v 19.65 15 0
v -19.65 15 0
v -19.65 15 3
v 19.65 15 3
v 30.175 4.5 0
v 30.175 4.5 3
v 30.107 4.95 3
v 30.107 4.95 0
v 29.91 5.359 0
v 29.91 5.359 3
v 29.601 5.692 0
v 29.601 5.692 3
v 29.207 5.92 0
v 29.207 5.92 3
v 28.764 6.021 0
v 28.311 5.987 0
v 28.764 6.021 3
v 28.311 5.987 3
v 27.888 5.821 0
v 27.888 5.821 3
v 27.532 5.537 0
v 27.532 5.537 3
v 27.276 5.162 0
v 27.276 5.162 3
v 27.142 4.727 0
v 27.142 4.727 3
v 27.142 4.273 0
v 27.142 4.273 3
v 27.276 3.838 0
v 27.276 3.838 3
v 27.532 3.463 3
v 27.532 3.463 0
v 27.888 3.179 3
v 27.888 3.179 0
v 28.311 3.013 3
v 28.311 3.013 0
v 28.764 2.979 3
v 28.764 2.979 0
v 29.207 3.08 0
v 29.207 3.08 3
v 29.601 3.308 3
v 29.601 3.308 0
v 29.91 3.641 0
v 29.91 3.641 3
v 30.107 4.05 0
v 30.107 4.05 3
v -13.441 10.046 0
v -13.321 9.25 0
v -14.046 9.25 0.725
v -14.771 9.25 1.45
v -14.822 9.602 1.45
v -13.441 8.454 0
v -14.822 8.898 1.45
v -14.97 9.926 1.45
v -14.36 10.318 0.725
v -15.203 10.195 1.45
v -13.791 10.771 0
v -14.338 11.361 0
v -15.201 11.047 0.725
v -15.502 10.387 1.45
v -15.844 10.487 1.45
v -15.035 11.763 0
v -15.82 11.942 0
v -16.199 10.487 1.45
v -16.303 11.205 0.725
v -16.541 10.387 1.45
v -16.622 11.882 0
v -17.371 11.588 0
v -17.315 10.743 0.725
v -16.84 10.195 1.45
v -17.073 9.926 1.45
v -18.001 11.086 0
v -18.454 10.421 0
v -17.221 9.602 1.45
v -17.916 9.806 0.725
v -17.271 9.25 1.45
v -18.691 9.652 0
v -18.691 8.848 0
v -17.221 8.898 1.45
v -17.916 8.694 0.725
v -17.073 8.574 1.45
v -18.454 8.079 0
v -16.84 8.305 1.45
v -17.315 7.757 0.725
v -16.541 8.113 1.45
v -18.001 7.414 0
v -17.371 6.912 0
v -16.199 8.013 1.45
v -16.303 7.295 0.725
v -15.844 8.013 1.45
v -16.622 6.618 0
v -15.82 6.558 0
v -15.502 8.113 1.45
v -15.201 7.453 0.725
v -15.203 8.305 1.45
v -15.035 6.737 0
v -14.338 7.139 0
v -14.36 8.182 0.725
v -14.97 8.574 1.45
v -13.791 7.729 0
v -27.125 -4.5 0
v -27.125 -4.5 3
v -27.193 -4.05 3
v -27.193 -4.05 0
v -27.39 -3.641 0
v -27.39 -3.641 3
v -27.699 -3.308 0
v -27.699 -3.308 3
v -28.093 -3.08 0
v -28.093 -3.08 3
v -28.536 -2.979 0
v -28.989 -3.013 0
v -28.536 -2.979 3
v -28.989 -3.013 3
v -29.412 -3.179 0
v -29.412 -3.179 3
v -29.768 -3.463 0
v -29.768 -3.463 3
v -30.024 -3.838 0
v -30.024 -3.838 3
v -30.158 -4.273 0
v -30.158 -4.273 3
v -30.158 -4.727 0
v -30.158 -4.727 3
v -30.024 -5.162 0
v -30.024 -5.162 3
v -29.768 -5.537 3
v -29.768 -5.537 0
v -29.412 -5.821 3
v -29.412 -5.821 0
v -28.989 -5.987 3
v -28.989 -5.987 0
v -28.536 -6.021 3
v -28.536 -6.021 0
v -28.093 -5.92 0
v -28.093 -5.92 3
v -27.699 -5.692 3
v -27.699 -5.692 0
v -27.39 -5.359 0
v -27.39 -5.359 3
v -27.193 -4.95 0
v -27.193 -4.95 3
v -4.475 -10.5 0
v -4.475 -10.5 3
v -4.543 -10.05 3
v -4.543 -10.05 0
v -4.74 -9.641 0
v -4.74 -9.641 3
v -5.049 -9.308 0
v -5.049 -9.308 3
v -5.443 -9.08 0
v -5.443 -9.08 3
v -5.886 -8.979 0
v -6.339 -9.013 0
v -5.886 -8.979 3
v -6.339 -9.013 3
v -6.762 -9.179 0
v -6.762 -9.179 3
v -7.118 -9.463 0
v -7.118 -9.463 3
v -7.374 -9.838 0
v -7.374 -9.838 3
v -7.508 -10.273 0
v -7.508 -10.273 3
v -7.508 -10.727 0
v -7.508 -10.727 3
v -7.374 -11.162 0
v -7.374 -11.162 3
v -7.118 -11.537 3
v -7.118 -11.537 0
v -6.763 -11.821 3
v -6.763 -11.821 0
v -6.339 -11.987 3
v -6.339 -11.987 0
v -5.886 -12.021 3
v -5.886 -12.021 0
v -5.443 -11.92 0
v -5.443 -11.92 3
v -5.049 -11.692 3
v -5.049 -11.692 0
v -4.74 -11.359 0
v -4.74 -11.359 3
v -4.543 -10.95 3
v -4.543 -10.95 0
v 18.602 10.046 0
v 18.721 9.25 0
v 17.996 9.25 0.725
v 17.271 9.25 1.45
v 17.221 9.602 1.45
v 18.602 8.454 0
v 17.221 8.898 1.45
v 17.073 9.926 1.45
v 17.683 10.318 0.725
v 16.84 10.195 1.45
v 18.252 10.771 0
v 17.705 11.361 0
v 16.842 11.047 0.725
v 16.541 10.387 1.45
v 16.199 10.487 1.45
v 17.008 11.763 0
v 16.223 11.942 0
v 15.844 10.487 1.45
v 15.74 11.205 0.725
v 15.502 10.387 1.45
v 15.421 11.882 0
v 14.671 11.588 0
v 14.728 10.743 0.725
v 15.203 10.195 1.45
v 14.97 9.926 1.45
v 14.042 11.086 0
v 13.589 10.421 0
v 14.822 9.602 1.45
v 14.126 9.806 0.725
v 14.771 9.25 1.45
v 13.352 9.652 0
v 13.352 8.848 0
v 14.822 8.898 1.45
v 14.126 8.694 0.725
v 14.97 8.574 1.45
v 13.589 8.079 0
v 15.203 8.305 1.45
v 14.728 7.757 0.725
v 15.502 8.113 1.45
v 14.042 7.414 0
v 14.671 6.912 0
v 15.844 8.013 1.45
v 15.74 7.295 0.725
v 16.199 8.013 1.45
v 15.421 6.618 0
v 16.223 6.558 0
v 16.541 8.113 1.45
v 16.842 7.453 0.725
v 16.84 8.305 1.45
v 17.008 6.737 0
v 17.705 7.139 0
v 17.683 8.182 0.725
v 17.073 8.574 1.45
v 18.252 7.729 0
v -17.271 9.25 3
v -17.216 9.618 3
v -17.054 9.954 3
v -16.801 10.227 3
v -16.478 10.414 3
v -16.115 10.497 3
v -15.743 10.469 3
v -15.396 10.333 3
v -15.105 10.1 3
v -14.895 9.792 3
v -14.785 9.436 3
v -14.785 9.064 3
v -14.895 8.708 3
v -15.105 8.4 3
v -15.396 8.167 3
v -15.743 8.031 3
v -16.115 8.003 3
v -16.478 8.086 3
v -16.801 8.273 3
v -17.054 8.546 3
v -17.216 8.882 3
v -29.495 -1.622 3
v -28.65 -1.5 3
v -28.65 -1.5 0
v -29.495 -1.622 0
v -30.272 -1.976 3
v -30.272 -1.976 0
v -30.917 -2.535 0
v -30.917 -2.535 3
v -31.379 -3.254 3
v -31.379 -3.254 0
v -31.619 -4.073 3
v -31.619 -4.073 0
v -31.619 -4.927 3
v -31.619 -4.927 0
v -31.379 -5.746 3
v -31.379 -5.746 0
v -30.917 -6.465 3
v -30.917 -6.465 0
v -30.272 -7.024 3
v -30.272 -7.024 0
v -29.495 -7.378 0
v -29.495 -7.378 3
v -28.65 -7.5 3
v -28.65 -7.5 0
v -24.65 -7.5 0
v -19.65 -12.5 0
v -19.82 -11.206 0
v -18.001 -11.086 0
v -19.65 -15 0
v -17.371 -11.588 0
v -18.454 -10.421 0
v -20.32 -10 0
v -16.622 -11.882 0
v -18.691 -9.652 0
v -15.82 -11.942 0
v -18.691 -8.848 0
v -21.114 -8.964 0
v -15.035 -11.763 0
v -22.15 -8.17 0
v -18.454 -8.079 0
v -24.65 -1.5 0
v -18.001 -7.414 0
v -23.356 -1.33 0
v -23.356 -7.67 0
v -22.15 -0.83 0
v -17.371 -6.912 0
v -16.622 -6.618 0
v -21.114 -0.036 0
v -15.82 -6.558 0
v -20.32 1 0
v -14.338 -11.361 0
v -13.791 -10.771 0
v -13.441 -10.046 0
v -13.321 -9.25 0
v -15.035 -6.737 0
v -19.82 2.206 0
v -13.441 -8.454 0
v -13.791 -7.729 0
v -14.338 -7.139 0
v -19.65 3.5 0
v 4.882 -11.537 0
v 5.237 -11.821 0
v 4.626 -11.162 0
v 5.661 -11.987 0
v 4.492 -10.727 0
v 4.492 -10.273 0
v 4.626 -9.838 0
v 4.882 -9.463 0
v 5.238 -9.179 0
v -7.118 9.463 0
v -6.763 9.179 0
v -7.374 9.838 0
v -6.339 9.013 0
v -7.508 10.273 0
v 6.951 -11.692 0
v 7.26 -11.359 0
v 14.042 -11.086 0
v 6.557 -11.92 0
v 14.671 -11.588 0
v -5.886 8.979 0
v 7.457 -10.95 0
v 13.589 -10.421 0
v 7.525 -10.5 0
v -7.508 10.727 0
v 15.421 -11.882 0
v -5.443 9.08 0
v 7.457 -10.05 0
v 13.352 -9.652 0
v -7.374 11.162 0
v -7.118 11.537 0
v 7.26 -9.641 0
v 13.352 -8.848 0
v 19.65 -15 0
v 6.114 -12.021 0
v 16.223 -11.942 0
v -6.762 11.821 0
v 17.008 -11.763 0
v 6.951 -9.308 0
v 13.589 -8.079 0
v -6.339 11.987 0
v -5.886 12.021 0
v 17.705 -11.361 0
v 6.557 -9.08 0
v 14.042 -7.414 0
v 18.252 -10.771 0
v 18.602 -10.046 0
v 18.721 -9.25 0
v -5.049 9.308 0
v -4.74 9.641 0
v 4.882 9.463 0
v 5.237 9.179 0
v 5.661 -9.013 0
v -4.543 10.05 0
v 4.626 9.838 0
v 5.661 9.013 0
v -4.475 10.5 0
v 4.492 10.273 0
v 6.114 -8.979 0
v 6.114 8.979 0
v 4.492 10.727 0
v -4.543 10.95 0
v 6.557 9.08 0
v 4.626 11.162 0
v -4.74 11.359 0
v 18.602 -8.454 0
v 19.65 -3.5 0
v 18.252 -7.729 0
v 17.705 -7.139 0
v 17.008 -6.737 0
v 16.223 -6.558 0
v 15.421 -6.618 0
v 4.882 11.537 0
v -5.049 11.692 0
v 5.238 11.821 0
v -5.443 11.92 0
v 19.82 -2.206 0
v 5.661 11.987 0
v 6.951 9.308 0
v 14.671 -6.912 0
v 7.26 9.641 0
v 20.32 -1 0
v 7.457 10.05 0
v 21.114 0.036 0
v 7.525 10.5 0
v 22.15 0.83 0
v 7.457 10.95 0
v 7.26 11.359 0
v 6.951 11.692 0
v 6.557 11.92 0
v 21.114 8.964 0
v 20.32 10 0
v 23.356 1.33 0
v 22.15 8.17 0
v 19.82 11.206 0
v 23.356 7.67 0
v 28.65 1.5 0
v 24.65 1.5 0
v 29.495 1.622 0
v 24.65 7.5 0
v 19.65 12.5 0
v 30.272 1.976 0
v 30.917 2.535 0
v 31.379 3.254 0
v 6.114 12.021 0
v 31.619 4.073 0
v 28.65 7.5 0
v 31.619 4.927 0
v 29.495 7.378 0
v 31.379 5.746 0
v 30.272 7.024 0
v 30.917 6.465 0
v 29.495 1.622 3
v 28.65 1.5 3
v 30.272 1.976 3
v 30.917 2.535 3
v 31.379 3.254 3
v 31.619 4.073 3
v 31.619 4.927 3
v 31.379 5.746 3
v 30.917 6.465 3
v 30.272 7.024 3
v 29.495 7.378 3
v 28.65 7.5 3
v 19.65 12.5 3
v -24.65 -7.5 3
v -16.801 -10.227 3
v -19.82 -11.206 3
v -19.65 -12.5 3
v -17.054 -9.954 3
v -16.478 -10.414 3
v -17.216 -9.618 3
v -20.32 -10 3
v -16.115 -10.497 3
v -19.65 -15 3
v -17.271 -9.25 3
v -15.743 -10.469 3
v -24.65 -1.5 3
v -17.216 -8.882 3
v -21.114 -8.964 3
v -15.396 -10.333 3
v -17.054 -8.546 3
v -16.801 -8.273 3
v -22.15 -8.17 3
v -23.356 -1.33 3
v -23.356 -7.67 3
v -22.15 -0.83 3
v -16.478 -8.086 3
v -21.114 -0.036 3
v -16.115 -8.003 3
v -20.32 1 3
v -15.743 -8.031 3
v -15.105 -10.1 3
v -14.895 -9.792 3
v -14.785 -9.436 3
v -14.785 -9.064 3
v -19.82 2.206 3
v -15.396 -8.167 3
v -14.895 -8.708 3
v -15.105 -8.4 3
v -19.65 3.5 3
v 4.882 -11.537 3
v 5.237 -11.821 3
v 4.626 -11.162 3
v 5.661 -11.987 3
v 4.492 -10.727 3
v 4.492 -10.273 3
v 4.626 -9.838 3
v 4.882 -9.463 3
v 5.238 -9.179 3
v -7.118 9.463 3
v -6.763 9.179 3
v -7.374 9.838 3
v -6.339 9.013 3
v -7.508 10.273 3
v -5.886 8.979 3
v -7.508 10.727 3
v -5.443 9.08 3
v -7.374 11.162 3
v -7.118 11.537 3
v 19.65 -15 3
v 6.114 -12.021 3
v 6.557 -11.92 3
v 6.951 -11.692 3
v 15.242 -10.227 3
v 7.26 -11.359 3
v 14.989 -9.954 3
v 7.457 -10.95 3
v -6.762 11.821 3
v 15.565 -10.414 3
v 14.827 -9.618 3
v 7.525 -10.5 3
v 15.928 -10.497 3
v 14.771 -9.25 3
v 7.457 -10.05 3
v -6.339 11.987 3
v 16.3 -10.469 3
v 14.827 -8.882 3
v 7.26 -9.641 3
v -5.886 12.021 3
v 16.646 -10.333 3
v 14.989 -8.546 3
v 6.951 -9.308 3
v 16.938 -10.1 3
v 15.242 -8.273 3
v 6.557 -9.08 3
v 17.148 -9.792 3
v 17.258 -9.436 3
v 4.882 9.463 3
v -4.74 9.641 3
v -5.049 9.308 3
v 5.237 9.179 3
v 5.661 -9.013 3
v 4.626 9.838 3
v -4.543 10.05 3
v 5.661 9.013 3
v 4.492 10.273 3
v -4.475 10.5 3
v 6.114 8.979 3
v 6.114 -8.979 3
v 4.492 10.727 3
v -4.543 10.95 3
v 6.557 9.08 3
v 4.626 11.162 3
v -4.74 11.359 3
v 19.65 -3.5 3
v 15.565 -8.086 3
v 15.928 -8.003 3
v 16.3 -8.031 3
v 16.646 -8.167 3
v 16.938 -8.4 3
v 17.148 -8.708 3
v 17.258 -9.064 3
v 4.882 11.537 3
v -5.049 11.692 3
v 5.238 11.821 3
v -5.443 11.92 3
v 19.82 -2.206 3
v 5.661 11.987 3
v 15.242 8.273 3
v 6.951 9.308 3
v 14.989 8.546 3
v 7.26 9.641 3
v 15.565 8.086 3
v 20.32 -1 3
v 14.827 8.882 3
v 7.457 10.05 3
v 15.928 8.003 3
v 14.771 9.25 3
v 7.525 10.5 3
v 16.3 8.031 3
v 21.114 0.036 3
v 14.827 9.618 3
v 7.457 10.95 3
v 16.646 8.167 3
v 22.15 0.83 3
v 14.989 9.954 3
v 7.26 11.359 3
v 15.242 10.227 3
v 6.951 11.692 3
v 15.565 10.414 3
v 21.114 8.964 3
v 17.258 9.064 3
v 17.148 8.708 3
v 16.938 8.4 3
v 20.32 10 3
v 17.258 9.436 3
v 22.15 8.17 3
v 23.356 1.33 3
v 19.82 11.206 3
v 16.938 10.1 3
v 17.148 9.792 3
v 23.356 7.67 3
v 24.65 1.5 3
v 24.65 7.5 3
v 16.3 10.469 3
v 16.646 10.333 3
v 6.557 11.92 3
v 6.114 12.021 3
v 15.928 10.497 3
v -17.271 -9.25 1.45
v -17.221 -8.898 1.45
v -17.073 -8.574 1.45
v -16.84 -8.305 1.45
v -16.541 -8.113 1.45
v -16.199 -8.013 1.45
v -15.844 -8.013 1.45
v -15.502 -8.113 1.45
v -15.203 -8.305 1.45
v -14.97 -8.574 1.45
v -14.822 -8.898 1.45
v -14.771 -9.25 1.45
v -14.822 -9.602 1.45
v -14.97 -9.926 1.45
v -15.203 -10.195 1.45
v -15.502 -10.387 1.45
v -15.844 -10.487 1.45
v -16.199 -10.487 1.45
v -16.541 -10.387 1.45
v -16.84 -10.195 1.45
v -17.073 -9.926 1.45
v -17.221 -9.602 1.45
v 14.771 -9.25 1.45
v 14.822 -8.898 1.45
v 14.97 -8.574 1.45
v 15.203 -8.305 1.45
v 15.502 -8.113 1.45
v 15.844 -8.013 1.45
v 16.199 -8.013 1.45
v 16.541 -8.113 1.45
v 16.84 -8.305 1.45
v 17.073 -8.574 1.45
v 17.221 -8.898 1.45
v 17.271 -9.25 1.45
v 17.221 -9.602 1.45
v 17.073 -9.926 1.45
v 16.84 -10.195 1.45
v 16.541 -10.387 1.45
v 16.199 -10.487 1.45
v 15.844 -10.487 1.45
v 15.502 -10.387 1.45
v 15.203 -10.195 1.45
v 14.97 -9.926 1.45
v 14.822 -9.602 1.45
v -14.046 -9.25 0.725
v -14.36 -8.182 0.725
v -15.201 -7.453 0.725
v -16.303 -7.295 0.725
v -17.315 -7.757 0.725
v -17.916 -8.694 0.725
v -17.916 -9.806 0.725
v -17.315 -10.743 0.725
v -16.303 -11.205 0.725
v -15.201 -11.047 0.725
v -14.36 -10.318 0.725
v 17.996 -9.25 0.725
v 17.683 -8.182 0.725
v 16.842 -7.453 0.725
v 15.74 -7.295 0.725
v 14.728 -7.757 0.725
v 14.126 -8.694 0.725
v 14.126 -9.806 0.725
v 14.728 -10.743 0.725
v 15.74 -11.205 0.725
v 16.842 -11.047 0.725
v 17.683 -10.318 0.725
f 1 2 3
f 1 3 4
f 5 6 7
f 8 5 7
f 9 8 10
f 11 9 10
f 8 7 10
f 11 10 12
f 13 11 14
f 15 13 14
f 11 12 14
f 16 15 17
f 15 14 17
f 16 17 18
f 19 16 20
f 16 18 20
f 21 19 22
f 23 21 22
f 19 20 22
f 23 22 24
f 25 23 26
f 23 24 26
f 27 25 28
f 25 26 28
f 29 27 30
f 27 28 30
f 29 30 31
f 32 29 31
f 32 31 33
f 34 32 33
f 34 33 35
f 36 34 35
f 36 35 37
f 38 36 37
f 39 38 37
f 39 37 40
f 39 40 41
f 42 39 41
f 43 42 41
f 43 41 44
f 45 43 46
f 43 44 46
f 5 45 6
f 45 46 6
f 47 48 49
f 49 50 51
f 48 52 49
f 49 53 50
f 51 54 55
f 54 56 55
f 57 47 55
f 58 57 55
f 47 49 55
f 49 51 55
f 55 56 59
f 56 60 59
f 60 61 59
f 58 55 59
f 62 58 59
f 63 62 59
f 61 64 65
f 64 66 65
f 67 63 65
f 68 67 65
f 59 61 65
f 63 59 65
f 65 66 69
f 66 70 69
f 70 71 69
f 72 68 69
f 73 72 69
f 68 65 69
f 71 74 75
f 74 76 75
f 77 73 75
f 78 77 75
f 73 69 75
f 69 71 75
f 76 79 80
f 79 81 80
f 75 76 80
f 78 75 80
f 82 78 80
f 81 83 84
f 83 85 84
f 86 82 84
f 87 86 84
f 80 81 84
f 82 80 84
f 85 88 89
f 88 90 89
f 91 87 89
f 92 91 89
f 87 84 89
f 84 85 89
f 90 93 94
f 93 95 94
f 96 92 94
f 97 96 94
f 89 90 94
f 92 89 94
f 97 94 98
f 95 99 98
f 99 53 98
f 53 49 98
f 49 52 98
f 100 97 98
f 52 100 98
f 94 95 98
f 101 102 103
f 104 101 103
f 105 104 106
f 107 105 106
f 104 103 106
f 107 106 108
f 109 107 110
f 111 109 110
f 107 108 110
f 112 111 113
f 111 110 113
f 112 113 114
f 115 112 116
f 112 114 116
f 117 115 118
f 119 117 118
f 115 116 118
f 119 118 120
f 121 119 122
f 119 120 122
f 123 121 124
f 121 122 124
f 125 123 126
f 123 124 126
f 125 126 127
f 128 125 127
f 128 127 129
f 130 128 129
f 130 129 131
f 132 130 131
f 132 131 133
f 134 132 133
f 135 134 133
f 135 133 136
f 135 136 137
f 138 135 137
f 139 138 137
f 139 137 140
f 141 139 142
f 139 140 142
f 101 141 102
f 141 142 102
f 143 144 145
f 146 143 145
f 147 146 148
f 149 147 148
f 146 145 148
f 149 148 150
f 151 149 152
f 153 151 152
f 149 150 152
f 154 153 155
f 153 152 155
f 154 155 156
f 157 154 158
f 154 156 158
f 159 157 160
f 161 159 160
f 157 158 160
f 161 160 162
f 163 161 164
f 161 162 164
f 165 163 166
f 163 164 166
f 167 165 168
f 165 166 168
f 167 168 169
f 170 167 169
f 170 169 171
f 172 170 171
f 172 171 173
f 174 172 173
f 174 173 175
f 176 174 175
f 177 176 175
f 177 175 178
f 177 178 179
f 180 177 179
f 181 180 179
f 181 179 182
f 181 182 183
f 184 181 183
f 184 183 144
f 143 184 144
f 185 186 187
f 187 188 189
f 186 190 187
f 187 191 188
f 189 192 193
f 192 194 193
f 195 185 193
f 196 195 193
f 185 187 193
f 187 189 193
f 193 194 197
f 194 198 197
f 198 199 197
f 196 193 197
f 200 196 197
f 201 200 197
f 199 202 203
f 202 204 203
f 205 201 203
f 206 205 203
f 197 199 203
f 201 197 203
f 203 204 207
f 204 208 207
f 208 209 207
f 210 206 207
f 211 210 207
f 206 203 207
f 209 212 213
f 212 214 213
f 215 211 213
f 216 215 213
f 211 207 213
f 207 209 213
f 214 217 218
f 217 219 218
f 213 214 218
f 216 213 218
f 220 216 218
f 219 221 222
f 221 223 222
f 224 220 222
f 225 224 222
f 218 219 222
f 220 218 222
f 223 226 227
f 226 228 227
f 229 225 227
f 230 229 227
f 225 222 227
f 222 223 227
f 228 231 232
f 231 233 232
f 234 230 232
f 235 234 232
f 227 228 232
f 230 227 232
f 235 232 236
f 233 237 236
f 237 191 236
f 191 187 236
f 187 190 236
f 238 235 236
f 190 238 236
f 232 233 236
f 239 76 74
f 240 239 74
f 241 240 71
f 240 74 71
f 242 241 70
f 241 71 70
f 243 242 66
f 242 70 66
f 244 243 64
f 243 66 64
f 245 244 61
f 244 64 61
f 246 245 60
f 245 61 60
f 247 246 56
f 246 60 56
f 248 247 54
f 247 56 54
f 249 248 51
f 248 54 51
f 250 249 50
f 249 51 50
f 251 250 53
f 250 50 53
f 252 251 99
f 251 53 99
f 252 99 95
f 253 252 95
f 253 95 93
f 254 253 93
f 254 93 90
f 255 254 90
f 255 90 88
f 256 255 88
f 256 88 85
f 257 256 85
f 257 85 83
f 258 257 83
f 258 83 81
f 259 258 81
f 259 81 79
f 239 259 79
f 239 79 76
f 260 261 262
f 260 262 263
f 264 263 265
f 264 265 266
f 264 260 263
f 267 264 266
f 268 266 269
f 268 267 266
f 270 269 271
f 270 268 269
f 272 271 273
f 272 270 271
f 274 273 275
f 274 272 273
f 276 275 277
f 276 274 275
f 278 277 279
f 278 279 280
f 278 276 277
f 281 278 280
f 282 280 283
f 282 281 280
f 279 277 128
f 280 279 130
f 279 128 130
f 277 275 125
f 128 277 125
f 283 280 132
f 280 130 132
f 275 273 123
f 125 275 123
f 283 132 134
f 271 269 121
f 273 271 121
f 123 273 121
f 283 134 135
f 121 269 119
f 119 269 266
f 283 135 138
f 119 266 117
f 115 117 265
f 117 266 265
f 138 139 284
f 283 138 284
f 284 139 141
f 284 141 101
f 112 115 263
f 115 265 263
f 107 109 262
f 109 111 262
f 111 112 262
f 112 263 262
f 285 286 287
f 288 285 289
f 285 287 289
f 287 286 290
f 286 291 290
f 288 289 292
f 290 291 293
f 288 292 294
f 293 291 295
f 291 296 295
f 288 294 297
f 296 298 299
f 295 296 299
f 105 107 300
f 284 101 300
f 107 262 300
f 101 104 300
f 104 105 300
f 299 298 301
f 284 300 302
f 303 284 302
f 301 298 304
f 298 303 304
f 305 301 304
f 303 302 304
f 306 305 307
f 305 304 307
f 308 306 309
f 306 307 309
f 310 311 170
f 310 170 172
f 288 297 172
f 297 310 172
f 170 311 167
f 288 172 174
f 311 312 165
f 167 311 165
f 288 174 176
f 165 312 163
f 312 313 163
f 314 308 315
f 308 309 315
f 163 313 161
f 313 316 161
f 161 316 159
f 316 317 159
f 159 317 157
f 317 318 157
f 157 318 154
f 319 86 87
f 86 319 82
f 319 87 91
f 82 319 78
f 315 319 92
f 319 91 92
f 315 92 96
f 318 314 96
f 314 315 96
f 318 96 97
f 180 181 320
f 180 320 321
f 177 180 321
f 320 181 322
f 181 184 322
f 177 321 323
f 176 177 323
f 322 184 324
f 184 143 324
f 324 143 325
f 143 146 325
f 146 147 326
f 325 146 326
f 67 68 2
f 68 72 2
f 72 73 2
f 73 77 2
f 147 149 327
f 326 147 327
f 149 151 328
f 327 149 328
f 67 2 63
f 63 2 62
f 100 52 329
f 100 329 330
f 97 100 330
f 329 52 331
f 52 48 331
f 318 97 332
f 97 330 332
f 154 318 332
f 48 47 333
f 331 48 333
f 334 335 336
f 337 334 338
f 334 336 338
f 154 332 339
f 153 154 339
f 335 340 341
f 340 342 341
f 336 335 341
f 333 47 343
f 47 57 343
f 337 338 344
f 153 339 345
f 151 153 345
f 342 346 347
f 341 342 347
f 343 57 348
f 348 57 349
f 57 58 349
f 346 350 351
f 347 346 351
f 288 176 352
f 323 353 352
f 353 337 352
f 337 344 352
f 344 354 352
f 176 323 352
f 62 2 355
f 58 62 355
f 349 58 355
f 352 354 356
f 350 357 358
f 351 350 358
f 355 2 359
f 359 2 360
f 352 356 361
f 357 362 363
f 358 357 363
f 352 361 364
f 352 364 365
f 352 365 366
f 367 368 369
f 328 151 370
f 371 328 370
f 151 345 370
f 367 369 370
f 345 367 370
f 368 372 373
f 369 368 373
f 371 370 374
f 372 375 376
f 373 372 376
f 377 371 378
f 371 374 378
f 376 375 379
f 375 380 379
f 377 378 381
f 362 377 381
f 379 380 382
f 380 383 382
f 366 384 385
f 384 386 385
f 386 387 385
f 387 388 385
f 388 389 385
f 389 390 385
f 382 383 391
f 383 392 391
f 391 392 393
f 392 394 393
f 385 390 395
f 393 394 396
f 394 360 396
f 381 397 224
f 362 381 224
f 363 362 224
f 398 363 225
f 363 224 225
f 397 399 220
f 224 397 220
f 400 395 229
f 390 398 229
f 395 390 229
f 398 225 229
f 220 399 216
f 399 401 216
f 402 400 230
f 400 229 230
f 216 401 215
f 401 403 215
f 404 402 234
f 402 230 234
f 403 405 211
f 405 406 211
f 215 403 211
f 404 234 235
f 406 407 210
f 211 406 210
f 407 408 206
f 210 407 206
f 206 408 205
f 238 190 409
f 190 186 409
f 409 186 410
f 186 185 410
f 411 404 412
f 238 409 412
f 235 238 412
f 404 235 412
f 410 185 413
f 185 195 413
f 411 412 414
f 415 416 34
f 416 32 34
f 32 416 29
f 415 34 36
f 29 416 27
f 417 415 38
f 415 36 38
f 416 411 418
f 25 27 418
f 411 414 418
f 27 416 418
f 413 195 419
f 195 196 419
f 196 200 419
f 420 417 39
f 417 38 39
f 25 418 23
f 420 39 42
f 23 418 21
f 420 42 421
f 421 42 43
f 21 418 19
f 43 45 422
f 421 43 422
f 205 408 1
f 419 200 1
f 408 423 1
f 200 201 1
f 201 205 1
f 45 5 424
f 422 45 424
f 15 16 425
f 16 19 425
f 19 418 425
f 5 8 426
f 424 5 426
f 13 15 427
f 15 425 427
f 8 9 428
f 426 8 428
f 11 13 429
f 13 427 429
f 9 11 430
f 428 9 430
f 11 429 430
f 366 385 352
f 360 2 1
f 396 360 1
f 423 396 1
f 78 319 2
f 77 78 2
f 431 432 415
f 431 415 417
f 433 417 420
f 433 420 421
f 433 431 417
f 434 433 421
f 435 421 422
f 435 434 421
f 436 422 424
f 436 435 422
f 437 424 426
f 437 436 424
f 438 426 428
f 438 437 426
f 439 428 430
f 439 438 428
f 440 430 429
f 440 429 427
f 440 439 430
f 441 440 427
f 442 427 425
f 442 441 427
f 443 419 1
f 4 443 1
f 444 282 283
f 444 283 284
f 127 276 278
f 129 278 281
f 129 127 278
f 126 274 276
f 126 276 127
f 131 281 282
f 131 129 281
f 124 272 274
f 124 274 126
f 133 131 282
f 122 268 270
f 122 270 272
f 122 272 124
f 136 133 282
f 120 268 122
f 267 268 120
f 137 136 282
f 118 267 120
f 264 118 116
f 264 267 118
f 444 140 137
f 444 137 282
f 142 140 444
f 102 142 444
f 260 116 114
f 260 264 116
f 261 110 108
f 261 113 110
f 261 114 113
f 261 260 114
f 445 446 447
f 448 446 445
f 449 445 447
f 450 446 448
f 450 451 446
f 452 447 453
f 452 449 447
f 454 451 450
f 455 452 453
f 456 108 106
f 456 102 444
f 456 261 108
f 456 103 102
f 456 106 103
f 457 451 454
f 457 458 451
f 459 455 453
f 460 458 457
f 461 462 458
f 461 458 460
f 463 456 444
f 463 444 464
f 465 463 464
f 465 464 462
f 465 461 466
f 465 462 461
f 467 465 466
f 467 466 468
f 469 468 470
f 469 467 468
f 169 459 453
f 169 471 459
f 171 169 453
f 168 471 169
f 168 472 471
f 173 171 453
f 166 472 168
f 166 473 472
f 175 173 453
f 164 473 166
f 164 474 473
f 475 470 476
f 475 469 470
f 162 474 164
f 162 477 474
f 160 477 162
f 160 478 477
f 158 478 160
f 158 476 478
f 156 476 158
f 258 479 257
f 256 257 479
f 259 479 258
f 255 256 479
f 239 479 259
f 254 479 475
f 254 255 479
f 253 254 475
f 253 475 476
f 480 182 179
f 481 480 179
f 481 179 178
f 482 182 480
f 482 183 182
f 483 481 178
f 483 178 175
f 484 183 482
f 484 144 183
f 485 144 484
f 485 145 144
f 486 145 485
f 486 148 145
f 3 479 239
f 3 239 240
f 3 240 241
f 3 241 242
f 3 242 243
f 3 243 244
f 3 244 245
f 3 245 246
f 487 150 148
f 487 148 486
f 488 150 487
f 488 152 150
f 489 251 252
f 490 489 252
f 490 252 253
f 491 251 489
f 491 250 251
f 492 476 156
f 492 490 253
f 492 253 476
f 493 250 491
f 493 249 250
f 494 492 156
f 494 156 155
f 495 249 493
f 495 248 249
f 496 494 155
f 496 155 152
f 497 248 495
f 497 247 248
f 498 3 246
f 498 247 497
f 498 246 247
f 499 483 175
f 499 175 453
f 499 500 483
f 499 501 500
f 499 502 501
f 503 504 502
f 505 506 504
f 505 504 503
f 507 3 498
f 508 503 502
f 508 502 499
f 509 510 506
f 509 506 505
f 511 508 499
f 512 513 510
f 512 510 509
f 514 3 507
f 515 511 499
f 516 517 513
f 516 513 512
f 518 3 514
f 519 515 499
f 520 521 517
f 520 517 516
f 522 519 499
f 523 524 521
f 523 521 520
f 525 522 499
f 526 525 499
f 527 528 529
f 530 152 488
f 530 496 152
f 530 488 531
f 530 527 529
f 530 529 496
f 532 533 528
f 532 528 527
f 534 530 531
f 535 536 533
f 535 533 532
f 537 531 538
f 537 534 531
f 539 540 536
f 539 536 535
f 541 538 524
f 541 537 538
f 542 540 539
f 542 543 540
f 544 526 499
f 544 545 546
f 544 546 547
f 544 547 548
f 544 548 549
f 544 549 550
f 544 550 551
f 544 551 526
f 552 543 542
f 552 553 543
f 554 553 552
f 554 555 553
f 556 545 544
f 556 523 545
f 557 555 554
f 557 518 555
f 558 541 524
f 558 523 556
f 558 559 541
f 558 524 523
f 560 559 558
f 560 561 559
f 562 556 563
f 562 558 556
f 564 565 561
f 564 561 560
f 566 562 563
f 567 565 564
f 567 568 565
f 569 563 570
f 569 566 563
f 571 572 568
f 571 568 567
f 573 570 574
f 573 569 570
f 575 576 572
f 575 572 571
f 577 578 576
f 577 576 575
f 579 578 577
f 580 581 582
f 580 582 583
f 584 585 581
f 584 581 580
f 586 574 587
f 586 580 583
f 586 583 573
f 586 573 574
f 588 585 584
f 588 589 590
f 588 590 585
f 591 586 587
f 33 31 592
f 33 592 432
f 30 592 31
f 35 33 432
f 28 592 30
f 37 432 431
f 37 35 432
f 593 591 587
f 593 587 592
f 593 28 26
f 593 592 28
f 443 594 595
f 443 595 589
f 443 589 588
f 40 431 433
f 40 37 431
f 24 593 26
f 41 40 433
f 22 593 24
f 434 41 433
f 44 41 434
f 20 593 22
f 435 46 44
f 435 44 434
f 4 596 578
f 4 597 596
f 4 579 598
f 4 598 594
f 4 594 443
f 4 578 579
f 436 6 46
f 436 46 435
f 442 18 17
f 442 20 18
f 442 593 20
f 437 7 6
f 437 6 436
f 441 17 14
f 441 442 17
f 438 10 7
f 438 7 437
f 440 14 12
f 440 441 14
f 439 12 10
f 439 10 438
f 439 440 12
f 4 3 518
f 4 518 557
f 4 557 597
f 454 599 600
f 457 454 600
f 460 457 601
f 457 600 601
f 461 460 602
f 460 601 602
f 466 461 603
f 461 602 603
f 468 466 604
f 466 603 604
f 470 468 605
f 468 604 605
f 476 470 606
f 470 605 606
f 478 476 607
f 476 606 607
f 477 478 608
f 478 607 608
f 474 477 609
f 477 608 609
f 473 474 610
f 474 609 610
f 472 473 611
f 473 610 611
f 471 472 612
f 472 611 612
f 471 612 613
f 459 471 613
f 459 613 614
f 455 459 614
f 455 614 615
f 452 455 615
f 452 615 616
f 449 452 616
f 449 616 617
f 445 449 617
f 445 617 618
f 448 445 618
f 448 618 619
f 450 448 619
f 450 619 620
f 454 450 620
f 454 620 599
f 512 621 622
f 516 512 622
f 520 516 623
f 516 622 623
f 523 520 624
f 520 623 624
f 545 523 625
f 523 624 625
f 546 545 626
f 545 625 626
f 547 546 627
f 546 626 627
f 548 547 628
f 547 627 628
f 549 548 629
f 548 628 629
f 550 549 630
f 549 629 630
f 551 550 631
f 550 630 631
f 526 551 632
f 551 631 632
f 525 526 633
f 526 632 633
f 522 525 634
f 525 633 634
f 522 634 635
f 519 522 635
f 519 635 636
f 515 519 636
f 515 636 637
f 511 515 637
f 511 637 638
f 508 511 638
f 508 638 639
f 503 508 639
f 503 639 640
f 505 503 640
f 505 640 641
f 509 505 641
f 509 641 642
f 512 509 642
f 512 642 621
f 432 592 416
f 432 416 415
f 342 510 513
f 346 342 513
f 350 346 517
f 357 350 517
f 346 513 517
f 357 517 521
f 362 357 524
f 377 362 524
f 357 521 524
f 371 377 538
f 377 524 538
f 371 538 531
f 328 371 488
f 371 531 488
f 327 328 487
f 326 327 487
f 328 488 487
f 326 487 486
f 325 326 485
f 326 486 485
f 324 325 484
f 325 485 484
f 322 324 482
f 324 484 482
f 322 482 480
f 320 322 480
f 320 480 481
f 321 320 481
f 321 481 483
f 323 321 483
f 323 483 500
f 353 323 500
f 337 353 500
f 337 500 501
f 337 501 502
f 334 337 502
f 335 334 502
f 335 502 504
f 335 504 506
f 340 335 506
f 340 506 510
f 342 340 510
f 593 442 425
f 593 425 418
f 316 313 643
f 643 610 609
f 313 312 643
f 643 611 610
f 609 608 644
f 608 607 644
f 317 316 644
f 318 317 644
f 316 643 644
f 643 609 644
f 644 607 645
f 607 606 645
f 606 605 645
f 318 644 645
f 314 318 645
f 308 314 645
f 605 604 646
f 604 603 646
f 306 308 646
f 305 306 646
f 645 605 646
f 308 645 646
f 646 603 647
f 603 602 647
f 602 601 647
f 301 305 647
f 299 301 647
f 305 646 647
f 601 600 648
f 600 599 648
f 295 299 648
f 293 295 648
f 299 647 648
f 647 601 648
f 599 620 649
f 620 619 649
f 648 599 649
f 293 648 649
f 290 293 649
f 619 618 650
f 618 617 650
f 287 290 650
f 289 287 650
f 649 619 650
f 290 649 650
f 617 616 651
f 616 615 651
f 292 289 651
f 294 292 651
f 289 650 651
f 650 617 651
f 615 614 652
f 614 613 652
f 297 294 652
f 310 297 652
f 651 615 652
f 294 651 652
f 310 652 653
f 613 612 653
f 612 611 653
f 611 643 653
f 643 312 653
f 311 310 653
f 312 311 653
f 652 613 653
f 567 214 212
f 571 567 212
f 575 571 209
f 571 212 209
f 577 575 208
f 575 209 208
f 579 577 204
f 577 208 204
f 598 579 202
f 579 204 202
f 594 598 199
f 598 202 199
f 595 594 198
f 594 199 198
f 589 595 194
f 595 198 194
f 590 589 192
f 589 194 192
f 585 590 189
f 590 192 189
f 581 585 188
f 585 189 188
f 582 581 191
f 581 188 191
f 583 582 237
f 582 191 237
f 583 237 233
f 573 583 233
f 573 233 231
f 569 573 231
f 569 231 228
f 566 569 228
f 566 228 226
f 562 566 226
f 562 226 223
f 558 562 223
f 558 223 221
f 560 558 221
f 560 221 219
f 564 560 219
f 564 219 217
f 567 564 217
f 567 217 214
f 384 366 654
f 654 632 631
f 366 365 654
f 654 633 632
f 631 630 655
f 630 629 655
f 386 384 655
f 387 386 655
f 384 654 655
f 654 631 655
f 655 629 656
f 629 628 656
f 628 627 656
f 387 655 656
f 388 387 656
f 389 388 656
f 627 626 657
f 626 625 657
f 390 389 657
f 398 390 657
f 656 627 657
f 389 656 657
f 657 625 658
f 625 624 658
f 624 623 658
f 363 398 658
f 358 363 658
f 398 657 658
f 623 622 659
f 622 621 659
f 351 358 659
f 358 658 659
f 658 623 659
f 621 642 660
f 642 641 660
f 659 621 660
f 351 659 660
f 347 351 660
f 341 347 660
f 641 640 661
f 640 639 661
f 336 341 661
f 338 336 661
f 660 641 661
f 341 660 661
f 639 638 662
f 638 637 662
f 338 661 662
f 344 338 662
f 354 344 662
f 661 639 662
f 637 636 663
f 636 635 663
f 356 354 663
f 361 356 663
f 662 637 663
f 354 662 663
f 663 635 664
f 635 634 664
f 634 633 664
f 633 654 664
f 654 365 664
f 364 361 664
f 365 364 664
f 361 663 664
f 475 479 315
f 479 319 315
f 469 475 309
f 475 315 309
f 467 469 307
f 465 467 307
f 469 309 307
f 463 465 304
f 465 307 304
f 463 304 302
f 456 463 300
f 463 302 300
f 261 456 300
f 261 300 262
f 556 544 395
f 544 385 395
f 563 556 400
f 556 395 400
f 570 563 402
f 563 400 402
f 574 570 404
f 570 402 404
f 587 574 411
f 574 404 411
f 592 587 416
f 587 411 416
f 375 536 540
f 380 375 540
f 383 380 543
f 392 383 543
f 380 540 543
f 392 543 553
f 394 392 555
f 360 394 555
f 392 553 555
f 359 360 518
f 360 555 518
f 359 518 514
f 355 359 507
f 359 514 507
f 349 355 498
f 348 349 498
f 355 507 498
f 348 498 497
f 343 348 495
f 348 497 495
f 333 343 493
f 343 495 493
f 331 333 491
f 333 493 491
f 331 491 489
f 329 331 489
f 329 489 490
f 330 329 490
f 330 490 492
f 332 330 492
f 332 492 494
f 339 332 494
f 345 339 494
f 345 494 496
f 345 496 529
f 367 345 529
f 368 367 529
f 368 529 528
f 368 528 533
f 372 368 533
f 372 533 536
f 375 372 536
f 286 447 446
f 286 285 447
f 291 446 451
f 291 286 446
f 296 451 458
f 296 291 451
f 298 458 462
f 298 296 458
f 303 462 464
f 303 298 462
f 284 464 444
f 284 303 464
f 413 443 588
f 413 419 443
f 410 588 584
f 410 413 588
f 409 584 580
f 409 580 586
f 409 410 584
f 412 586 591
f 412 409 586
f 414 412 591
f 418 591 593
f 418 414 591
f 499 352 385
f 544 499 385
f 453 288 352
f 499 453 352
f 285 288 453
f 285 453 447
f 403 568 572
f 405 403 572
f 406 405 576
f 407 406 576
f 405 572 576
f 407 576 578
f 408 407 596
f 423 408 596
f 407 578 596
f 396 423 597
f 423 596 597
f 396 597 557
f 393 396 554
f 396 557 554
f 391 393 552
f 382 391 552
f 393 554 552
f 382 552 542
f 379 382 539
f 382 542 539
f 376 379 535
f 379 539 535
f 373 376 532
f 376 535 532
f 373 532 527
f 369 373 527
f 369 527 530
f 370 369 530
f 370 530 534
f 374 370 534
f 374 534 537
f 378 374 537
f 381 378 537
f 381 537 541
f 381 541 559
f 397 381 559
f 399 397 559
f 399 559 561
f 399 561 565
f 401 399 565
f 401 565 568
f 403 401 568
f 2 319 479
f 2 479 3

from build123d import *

# Parameters (mm, degrees)
SKETCH_1_W                     = 39.3
SKETCH_1_H                     = 30
EXTRUDE_1_DEPTH                = 3
SKETCH_2_R                     = 1.525
EXTRUDE_2_DEPTH                = 3
SKETCH_4_R                     = 1.525
EXTRUDE_3_DEPTH                = 3
FILLET_1_R                     = 5
SKETCH_5_R                     = 1.525
CUT_EXTRUDE_1_DEPTH            = 30
SKETCH_6_R                     = 1.25
CUT_EXTRUDE_2_DEPTH            = 40
HOLE_WIZARD_M2_5_1_D           = 2.5
HOLE_WIZARD_M2_5_1_CSINK_D     = 5.4
HOLE_WIZARD_M2_5_1_CSINK_ANGLE = 90


with BuildPart() as part:
    # 草图1 → 凸台-拉伸1 (new body)
    with BuildSketch(Plane.XY):
        Rectangle(SKETCH_1_W, SKETCH_1_H)
    extrude(amount=EXTRUDE_1_DEPTH)

    # 草图2 → 凸台-拉伸2 (add)
    with BuildSketch(Plane.XY.offset(3)):
        with BuildLine():
            Line((-28.65, -7.5), (-19.65, -7.5))
            Line((-19.65, -7.5), (-19.65, -1.5))
            Line((-19.65, -1.5), (-28.65, -1.5))
            ThreePointArc((-28.65, -1.5), (-31.65, -4.5), (-28.65, -7.5))
        make_face()
        with Locations((-28.65, -4.5)):
            Circle(SKETCH_2_R, mode=Mode.SUBTRACT)
    extrude(amount=-EXTRUDE_2_DEPTH)

    # 草图4 → 凸台-拉伸3 (add)
    with BuildSketch(Plane.XY.offset(3)):
        with BuildLine():
            Line((28.65, 7.5), (19.65, 7.5))
            Line((19.65, 7.5), (19.65, 1.5))
            Line((19.65, 1.5), (28.65, 1.5))
            ThreePointArc((28.65, 1.5), (31.65, 4.5), (28.65, 7.5))
        make_face()
        with Locations((28.65, 4.5)):
            Circle(SKETCH_4_R, mode=Mode.SUBTRACT)
    extrude(amount=-EXTRUDE_3_DEPTH)

    # 圆角1
    fillet_1_edges = [part.edges().sort_by_distance(p)[0] for p in [
        (-19.65, -1.5, 1.5),
        (-19.65, -7.5, 1.5),
        (19.65, 1.5, 1.5),
        (19.65, 7.5, 1.5),
    ]]
    fillet(fillet_1_edges, radius=FILLET_1_R)

    # 草图5 → 切除-拉伸1 (cut)
    with BuildSketch(Plane.XY.offset(3)):
        with Locations((6, 10.5)):
            Circle(SKETCH_5_R)
        with Locations((-6, 10.5)):
            Circle(SKETCH_5_R)
        with Locations((-6, -10.5)):
            Circle(SKETCH_5_R)
        with Locations((6, -10.5)):
            Circle(SKETCH_5_R)
    extrude(amount=-CUT_EXTRUDE_1_DEPTH, mode=Mode.SUBTRACT)

    # 草图6 → 切除-拉伸2 (cut)
    with BuildSketch(Plane(origin=(0, 0, 0), x_dir=(-1, 0, 0), z_dir=(0, 0, -1))):
        with Locations((16.02146997, 9.25)):
            Circle(SKETCH_6_R)
        with Locations((-16.02146997, -9.25)):
            Circle(SKETCH_6_R)
        with Locations((16.02146997, -9.25)):
            Circle(SKETCH_6_R)
        with Locations((-16.02146997, 9.25)):
            Circle(SKETCH_6_R)
    extrude(amount=-CUT_EXTRUDE_2_DEPTH, mode=Mode.SUBTRACT)

    # M2.5 十字槽半沉头木螺钉的锥形沉头孔1 (through all)
    with Locations(Plane(origin=(0, 0, 0), x_dir=(-1, 0, 0), z_dir=(0, 0, -1))):
        with Locations((-16.02146997, 9.25), (-16.02146997, -9.25), (16.02146997, 9.25), (16.02146997, -9.25)):
            CounterSinkHole(HOLE_WIZARD_M2_5_1_D / 2, HOLE_WIZARD_M2_5_1_CSINK_D / 2, counter_sink_angle=HOLE_WIZARD_M2_5_1_CSINK_ANGLE)


solid = part.part
